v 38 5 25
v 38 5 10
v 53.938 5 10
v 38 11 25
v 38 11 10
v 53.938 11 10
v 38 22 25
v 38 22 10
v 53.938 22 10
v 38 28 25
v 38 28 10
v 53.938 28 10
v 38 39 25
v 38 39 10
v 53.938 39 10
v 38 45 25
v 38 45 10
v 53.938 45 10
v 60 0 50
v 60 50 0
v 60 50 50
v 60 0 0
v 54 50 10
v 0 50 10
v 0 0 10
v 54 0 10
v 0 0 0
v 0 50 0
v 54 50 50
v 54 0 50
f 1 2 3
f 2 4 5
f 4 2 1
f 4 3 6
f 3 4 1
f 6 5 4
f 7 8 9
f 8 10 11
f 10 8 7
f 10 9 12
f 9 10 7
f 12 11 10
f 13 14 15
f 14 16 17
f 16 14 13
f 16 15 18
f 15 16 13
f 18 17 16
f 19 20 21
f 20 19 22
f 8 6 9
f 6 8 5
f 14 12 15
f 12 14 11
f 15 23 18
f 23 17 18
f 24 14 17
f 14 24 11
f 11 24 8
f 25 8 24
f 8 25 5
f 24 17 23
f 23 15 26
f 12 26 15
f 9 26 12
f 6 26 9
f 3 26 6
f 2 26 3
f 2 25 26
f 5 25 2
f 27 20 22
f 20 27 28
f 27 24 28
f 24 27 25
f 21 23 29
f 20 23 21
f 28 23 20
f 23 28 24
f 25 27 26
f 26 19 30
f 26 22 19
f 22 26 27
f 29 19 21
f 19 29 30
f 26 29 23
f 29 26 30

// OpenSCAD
$fn = 32;

// ----------------------------------------------------------------------
// Rib bracket: 3-gusset L bracket
// ----------------------------------------------------------------------

// --- parameters (mm) ---
base_l = 60;              // foot length, X
base_w = 50;              // foot width, Y
base_t = 10;              // foot thickness
plate_t = 6;              // upright plate thickness
plate_h = 50;             // overall height
gus_l = 16;               // gusset leg along the foot
gus_h = 16;               // gusset height
gus_t = 6;                // gusset thickness
gus_edge = 5;             // gusset margin from the foot edge
n_gus = 3;                // gusset count

gus_pitch = (base_w - 2 * gus_edge - gus_t) / (n_gus - 1);  // gusset pitch

union() {
  cube([base_l, base_w, base_t]);
  translate([base_l - plate_t, 0, base_t - 1])
    cube([plate_t, base_w, plate_h - base_t + 1]);
  for (i = [0 : n_gus - 1])
    translate([base_l - plate_t - gus_l, gus_edge + i * gus_pitch, base_t - 1])
      rotate([-90, 0, 0])
        linear_extrude(height = gus_t)
          polygon(points = [[0, 0], [gus_l + 1, 0], [0, -gus_h]]);
}
